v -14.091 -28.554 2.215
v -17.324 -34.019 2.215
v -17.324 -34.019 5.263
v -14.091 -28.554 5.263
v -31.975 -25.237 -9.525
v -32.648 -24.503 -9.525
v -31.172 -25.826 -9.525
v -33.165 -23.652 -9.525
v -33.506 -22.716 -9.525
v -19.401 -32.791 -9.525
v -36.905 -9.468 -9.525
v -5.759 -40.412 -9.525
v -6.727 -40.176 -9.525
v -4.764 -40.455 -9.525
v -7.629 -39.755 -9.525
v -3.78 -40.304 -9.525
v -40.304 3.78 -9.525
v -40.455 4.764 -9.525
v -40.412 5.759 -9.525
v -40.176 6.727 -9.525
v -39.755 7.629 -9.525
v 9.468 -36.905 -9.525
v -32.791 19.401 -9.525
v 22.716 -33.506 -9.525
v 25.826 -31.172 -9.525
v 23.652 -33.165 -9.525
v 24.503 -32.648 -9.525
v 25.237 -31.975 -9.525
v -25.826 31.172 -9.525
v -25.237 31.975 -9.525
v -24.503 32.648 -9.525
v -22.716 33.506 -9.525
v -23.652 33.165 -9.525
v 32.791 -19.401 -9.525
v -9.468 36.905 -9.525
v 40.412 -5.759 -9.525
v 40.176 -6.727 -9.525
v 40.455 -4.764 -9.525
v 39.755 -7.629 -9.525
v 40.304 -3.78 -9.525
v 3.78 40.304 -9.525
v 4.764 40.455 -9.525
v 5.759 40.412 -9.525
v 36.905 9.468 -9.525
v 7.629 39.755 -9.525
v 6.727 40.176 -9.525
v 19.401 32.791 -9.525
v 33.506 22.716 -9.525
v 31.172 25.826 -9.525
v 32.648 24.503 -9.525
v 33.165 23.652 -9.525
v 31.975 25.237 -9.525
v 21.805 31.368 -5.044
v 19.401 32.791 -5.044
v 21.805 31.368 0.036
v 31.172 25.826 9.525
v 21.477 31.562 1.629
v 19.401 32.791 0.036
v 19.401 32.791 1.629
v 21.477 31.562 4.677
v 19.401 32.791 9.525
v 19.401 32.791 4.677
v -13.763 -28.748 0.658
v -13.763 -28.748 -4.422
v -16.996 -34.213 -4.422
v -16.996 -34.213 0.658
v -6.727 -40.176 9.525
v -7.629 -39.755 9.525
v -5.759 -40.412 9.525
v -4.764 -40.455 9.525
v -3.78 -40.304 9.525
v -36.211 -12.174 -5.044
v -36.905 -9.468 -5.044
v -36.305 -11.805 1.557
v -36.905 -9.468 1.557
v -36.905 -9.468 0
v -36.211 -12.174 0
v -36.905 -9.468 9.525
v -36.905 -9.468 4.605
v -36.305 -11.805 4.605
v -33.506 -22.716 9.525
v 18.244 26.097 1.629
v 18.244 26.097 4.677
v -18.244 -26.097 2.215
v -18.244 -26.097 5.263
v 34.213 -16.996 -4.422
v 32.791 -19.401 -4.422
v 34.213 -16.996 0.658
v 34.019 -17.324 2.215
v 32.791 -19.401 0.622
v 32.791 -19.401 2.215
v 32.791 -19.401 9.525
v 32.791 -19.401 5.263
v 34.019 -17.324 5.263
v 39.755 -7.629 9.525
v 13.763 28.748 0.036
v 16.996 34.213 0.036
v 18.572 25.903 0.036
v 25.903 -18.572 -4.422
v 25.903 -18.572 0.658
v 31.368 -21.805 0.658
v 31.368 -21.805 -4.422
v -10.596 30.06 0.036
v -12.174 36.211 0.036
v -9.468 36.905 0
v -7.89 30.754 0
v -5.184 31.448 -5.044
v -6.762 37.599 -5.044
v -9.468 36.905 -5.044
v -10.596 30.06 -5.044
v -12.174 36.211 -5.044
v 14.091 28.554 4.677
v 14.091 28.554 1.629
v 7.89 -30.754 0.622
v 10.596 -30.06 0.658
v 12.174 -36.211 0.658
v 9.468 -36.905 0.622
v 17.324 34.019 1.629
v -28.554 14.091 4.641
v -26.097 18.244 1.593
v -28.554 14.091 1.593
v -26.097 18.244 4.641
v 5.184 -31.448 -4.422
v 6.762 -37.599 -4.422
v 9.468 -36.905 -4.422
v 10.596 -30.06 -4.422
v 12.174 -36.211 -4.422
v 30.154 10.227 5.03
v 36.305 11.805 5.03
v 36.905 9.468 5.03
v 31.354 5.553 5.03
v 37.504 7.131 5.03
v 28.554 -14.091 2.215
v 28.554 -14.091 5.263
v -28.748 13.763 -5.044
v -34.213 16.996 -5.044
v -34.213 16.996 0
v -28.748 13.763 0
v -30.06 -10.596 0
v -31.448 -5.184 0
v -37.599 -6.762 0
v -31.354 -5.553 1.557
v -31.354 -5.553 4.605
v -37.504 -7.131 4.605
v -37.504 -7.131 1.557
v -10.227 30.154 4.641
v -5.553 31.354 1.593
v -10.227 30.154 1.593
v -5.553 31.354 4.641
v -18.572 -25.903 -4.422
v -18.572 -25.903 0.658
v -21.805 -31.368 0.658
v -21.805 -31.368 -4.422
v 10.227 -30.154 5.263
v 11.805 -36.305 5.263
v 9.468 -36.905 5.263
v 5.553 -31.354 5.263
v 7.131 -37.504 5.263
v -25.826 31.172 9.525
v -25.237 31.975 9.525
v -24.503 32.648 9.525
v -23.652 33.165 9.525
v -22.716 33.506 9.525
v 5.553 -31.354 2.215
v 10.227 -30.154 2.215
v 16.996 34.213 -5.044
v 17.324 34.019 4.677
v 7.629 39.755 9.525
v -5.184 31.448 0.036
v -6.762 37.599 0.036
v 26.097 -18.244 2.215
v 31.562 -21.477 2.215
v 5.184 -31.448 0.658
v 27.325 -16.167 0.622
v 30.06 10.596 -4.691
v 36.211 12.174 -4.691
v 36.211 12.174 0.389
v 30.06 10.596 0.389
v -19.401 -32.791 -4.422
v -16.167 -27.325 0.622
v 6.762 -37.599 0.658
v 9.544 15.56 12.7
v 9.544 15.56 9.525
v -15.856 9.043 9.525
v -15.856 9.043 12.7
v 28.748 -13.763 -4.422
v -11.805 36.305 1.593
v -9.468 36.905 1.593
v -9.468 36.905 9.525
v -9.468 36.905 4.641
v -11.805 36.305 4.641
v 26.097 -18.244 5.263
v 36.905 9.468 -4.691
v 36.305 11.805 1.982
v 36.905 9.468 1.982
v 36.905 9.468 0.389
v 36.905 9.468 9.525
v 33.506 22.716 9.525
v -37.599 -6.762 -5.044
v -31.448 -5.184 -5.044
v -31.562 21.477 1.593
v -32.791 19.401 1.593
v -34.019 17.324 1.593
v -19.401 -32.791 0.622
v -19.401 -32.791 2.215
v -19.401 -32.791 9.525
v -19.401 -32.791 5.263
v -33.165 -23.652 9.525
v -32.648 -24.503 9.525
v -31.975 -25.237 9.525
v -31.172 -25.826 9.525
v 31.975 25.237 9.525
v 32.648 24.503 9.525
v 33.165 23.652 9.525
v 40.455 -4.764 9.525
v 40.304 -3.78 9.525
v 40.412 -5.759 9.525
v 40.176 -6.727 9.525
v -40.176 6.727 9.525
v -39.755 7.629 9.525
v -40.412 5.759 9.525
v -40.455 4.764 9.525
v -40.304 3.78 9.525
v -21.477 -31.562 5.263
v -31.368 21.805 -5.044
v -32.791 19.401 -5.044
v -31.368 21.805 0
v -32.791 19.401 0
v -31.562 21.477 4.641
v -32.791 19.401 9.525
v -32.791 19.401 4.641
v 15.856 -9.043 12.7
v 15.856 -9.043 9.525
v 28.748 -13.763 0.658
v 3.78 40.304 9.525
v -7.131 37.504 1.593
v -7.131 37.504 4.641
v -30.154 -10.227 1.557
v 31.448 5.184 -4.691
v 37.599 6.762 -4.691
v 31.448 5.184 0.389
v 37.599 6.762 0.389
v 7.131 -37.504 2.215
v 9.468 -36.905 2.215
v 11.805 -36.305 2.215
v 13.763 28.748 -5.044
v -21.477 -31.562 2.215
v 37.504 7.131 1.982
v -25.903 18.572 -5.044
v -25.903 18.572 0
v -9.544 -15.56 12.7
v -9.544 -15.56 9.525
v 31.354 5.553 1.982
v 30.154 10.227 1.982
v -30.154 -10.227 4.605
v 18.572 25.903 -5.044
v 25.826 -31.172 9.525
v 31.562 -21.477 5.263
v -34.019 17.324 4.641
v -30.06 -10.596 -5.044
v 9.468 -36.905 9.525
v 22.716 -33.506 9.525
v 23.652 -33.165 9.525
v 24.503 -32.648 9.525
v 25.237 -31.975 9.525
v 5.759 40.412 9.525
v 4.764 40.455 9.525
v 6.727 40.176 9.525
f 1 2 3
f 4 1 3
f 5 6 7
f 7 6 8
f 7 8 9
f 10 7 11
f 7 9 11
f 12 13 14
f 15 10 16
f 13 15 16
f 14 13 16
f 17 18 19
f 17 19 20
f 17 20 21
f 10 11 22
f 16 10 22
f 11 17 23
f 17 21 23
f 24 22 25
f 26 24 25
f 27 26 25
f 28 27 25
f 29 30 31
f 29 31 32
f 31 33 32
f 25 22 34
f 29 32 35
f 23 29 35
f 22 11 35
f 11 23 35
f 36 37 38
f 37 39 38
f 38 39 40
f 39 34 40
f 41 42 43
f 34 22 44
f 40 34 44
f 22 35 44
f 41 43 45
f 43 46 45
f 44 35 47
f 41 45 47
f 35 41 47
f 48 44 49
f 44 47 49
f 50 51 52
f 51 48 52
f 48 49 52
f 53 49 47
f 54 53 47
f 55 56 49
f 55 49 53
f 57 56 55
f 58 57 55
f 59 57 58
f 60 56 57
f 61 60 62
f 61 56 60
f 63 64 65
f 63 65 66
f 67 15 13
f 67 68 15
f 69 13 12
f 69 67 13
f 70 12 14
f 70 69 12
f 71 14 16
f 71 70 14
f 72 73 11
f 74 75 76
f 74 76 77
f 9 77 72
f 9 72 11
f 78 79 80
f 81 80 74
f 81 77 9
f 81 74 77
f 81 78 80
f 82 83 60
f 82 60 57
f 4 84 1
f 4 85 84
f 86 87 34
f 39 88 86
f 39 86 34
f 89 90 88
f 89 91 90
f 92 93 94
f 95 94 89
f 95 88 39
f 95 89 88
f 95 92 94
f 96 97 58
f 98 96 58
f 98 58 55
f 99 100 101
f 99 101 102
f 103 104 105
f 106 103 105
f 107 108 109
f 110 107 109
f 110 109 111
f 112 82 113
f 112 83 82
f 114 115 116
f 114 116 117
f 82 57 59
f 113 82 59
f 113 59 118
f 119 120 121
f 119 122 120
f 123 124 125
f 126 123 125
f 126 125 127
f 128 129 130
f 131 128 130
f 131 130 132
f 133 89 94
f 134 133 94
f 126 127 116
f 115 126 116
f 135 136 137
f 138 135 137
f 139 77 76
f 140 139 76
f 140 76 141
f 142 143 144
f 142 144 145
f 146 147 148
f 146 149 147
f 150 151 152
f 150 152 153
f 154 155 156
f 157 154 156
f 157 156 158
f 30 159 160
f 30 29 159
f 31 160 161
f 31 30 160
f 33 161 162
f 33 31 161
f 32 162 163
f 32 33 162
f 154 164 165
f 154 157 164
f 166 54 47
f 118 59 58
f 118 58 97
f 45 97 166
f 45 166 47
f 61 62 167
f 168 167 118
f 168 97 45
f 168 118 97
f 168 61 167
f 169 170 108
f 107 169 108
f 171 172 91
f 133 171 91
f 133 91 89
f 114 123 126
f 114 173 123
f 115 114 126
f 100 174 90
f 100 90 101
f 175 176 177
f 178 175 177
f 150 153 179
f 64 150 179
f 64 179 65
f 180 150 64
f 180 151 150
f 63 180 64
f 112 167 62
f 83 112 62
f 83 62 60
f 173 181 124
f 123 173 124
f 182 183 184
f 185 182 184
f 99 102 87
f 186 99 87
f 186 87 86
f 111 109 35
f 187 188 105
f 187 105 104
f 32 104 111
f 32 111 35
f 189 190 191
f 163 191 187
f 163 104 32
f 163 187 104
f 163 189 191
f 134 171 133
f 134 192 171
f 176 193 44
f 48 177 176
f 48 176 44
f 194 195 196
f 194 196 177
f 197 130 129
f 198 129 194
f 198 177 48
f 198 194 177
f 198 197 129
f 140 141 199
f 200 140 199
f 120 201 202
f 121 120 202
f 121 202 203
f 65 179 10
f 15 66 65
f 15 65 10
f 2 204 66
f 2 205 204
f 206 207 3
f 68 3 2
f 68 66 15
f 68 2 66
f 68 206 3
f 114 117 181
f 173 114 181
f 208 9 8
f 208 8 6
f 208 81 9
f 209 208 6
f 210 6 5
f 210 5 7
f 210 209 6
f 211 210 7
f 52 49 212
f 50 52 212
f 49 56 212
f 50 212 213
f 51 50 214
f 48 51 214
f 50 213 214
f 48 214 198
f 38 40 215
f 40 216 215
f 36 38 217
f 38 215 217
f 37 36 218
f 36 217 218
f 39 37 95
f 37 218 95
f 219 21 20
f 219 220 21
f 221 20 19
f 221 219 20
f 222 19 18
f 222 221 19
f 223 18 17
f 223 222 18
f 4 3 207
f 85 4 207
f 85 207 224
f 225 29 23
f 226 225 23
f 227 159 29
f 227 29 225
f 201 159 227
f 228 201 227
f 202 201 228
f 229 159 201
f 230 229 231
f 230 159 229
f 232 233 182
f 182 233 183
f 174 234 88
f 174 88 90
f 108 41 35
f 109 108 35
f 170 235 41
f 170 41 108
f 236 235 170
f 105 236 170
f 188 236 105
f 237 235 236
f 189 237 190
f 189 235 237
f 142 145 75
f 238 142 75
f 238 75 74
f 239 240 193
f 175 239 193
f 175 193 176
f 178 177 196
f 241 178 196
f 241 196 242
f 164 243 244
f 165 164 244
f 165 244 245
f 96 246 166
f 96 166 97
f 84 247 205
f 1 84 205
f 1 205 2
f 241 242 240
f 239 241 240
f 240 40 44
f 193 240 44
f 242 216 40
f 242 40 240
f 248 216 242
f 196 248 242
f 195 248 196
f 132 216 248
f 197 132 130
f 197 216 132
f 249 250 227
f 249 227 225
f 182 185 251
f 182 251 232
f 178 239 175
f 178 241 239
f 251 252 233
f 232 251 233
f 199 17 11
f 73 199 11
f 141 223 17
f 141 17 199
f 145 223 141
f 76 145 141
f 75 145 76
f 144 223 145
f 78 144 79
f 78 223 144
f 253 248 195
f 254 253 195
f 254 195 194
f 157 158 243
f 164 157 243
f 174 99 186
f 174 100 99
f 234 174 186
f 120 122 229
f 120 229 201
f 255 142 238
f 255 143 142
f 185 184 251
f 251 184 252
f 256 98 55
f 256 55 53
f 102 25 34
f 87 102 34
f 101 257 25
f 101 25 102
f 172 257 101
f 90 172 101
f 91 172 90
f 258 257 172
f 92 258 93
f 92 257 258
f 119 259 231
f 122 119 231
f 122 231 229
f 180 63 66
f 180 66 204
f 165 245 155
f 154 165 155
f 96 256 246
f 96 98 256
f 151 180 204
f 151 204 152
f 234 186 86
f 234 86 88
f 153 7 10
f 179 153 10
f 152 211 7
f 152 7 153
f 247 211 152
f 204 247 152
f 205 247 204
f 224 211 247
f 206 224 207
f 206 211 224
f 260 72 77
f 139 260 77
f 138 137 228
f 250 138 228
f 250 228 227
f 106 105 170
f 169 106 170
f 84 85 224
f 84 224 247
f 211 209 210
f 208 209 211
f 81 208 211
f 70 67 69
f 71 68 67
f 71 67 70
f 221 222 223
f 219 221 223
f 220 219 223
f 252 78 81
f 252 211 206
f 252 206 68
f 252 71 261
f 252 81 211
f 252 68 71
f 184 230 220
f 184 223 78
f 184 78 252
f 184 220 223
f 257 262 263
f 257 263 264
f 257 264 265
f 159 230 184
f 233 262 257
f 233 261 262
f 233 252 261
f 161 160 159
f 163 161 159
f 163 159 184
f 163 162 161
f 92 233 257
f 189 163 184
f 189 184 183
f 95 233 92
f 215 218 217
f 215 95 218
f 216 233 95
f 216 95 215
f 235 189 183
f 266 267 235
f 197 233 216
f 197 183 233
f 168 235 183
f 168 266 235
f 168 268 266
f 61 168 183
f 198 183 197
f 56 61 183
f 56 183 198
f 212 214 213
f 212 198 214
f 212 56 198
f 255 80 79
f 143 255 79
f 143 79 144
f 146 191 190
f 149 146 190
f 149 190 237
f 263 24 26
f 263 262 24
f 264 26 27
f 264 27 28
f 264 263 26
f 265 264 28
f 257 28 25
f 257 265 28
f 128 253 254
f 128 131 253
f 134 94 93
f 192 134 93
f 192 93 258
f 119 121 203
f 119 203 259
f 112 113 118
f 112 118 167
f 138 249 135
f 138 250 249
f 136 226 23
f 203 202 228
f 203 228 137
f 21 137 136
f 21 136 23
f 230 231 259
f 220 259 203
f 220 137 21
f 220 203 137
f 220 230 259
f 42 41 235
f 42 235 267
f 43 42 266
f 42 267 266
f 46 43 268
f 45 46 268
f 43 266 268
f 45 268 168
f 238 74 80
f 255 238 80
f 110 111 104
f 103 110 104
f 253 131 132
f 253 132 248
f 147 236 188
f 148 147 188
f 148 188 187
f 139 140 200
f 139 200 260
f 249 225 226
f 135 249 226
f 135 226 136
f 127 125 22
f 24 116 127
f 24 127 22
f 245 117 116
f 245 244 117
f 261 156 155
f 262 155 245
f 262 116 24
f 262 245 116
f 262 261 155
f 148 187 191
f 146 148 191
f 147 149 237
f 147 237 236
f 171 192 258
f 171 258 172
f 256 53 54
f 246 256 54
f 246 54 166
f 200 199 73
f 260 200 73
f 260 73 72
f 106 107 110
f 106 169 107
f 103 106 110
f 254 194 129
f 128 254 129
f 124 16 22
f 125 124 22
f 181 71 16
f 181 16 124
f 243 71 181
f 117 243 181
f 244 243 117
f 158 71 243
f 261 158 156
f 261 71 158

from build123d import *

# Parameters (mm, degrees)
F1_DEPTH  = 9.525
F3_DEPTH  = 6.35
F5_DEPTH  = 6.35
F7_DEPTH  = 6.35
F9_DEPTH  = 6.35
F11_DEPTH = 6.35
F13_DEPTH = 6.35
F15_DEPTH = 6.35
F17_DEPTH = 6.35
F19_DEPTH = 3.175
F20_R     = 5.08


# Not quite as in the source:
# - a feature names something its author has since deleted; it is built from what else it names


with BuildPart() as f1:
    # F0 (on Top) → F1 (new body, symmetric)
    with BuildSketch(Plane.XY):
        Polygon((-32.7905689314, 19.40073682), (-40.8266172422, 5.8184384507), (-36.9048262157, -9.4680410849), (0, 0), align=None)
        Polygon((-24.7545206205, 32.9830351893), (-32.7905689314, 19.40073682), (0, 0), (-9.4680410849, 36.9048262157), align=None)
        Polygon((-9.4680410849, 36.9048262157), (0, 0), (19.40073682, 32.7905689314), (5.8184384507, 40.8266172422), align=None)
        Polygon((19.40073682, 32.7905689314), (0, 0), (36.9048262157, 9.4680410849), (32.9830351893, 24.7545206205), align=None)
        Polygon((36.9048262157, 9.4680410849), (0, 0), (32.7905689314, -19.40073682), (40.8266172422, -5.8184384507), align=None)
        Polygon((32.7905689314, -19.40073682), (0, 0), (9.4680410849, -36.9048262157), (24.7545206205, -32.9830351893), align=None)
        Polygon((9.4680410849, -36.9048262157), (0, 0), (-19.40073682, -32.7905689314), (-5.8184384507, -40.8266172422), align=None)
        Polygon((0, 0), (-36.9048262157, -9.4680410849), (-32.9830351893, -24.7545206205), (-19.40073682, -32.7905689314), align=None)
    extrude(amount=F1_DEPTH, both=True)

    # F2 (on face) → F3 (cut)
    with BuildSketch(Plane(origin=(-36.9048262157, -9.4680410849, 0), x_dir=(0.2485050154, -0.9686306093, 0), z_dir=(-0.9686306093, -0.2485050154, 0))):
        Polygon((-2.794, 0), (-2.794, -2.521839), (-2.794, -5.043678), (2.794, -5.043678), (2.794, -2.521839), (2.794, 0), align=None)
        Polygon((-2.413, 1.556766), (0, 1.556766), (2.413, 1.556766), (2.413, 4.604766), (-2.413, 4.604766), align=None)
    extrude(amount=-F3_DEPTH, mode=Mode.SUBTRACT)

    # F4 (on face) → F5 (cut)
    with BuildSketch(Plane(origin=(-9.4680410849, 36.9048262157, 0), x_dir=(-0.9686306093, -0.2485050154, 0), z_dir=(-0.2485050154, 0.9686306093, 0))):
        Polygon((-2.794, -5.043678), (0, -5.043678), (2.794, -5.043678), (2.794, 0.036322), (0, 0), (-2.794, 0.036322), align=None)
        Polygon((-2.413, 1.593088), (0, 1.593088), (2.413, 1.593088), (2.413, 4.641088), (0, 4.641088), (-2.413, 4.641088), align=None)
    extrude(amount=-F5_DEPTH, mode=Mode.SUBTRACT)

    # F6 (on face) → F7 (cut)
    with BuildSketch(Plane(origin=(-32.7905689314, 19.40073682, 0), x_dir=(-0.5092056908, -0.8606448538, 0), z_dir=(-0.8606448538, 0.5092056908, 0))):
        Polygon((-2.413, 1.593088), (0, 1.593088), (2.413, 1.593088), (2.413, 4.641088), (0, 4.641088), (-2.413, 4.641088), align=None)
        Polygon((-2.794, -5.043678), (0, -5.043678), (2.794, -5.043678), (2.793763897, 0), (-2.793763897, 0), align=None)
    extrude(amount=-F7_DEPTH, mode=Mode.SUBTRACT)

    # F8 (on face) → F9 (cut)
    with BuildSketch(Plane(origin=(19.40073682, 32.7905689314, 0), x_dir=(-0.8606448538, 0.5092056908, 0), z_dir=(0.5092056908, 0.8606448538, 0))):
        Polygon((-2.413, 1.62941), (0, 1.62941), (2.413, 1.62941), (2.413, 4.67741), (-2.413, 4.67741), align=None)
        Polygon((-2.794, -5.043678), (0, -5.043678), (2.794, -5.043678), (2.794, 0.036322), (-2.794, 0.036322), align=None)
    extrude(amount=-F9_DEPTH, mode=Mode.SUBTRACT)

    # F10 (on face) → F11 (cut)
    with BuildSketch(Plane(origin=(36.9048262157, 9.4680410849, 0), x_dir=(-0.2485050154, 0.9686306093, 0), z_dir=(0.9686306093, 0.2485050154, 0))):
        Polygon((-2.794, -4.6912106667), (0, -4.6912106667), (2.794, -4.6912106667), (2.794, 0.3887893333), (-2.794, 0.3887893333), align=None)
        Polygon((-2.413, 1.9818773333), (0, 1.9818773333), (2.413, 1.9818773333), (2.413, 5.0298773333), (-2.413, 5.0298773333), align=None)
    extrude(amount=-F11_DEPTH, mode=Mode.SUBTRACT)

    # F12 (on face) → F13 (cut)
    with BuildSketch(Plane(origin=(32.7905689314, -19.40073682, 0), x_dir=(0.5092056908, 0.8606448538, 0), z_dir=(0.8606448538, -0.5092056908, 0))):
        Polygon((-2.7940002649, -4.4215812), (-2.649e-07, -4.4215812), (2.7939997351, -4.4215812), (2.7939997351, 0.6584188), (-2.649e-07, 0.6220968), (-2.7940002649, 0.6584188), align=None)
        Polygon((-2.4130002649, 2.2151848), (-2.649e-07, 2.2151848), (2.4129997351, 2.2151848), (2.4129997351, 5.2631848), (-2.649e-07, 5.2631848), (-2.4130002649, 5.2631848), align=None)
    extrude(amount=-F13_DEPTH, mode=Mode.SUBTRACT)

    # F14 (on face) → F15 (cut)
    with BuildSketch(Plane(origin=(9.4680410849, -36.9048262157, 0), x_dir=(0.9686306093, 0.2485050154, 0), z_dir=(0.2485050154, -0.9686306093, 0))):
        Polygon((-2.7940002649, -4.4215812), (-2.649e-07, -4.4215812), (2.7939997351, -4.4215812), (2.7939997351, 0.6584188), (-2.649e-07, 0.6220968), (-2.7940002649, 0.6584188), align=None)
        Polygon((-2.4130002649, 2.2151848), (-2.649e-07, 2.2151848), (2.4129997351, 2.2151848), (2.4129997351, 5.2631848), (-2.649e-07, 5.2631848), (-2.4130002649, 5.2631848), align=None)
    extrude(amount=-F15_DEPTH, mode=Mode.SUBTRACT)

    # F16 (on face) → F17 (cut)
    with BuildSketch(Plane(origin=(-19.40073682, -32.7905689314, 0), x_dir=(0.8606448538, -0.5092056908, 0), z_dir=(-0.5092056908, -0.8606448538, 0))):
        Polygon((-2.4130002649, 2.2151848), (-2.649e-07, 2.2151848), (2.4129997351, 2.2151848), (2.4129997351, 5.2631848), (-2.649e-07, 5.2631848), (-2.4130002649, 5.2631848), align=None)
        Polygon((-2.7940002649, -4.4215812), (-2.649e-07, -4.4215812), (2.7939997351, -4.4215812), (2.7939997351, 0.6584188), (-2.649e-07, 0.6220968), (-2.7940002649, 0.6584188), align=None)
    extrude(amount=-F17_DEPTH, mode=Mode.SUBTRACT)

    # F18 (on face) → F19 (join)
    with BuildSketch(Plane.XY.offset(9.525)):
        Polygon((-3.156013695, 12.3016087386), (-15.856013695, 9.0433866005), (-9.543986305, -15.5598308767), (3.156013695, -12.3016087386), (15.856013695, -9.0433866005), (9.543986305, 15.5598308767), align=None)
    extrude(amount=F19_DEPTH)

    # F20
    f20_edges = [f1.edges().sort_by_distance(p)[0] for p in [
        (-5.818438, -40.826617, 0),
        (24.754521, -32.983035, 0),
        (40.826617, -5.818438, 0),
        (32.983035, 24.754521, 0),
        (5.818438, 40.826617, 0),
        (-24.754521, 32.983035, 0),
        (-40.826617, 5.818438, 0),
        (-32.983035, -24.754521, 0),
    ]]
    fillet(f20_edges, radius=F20_R)


solid = f1.part
